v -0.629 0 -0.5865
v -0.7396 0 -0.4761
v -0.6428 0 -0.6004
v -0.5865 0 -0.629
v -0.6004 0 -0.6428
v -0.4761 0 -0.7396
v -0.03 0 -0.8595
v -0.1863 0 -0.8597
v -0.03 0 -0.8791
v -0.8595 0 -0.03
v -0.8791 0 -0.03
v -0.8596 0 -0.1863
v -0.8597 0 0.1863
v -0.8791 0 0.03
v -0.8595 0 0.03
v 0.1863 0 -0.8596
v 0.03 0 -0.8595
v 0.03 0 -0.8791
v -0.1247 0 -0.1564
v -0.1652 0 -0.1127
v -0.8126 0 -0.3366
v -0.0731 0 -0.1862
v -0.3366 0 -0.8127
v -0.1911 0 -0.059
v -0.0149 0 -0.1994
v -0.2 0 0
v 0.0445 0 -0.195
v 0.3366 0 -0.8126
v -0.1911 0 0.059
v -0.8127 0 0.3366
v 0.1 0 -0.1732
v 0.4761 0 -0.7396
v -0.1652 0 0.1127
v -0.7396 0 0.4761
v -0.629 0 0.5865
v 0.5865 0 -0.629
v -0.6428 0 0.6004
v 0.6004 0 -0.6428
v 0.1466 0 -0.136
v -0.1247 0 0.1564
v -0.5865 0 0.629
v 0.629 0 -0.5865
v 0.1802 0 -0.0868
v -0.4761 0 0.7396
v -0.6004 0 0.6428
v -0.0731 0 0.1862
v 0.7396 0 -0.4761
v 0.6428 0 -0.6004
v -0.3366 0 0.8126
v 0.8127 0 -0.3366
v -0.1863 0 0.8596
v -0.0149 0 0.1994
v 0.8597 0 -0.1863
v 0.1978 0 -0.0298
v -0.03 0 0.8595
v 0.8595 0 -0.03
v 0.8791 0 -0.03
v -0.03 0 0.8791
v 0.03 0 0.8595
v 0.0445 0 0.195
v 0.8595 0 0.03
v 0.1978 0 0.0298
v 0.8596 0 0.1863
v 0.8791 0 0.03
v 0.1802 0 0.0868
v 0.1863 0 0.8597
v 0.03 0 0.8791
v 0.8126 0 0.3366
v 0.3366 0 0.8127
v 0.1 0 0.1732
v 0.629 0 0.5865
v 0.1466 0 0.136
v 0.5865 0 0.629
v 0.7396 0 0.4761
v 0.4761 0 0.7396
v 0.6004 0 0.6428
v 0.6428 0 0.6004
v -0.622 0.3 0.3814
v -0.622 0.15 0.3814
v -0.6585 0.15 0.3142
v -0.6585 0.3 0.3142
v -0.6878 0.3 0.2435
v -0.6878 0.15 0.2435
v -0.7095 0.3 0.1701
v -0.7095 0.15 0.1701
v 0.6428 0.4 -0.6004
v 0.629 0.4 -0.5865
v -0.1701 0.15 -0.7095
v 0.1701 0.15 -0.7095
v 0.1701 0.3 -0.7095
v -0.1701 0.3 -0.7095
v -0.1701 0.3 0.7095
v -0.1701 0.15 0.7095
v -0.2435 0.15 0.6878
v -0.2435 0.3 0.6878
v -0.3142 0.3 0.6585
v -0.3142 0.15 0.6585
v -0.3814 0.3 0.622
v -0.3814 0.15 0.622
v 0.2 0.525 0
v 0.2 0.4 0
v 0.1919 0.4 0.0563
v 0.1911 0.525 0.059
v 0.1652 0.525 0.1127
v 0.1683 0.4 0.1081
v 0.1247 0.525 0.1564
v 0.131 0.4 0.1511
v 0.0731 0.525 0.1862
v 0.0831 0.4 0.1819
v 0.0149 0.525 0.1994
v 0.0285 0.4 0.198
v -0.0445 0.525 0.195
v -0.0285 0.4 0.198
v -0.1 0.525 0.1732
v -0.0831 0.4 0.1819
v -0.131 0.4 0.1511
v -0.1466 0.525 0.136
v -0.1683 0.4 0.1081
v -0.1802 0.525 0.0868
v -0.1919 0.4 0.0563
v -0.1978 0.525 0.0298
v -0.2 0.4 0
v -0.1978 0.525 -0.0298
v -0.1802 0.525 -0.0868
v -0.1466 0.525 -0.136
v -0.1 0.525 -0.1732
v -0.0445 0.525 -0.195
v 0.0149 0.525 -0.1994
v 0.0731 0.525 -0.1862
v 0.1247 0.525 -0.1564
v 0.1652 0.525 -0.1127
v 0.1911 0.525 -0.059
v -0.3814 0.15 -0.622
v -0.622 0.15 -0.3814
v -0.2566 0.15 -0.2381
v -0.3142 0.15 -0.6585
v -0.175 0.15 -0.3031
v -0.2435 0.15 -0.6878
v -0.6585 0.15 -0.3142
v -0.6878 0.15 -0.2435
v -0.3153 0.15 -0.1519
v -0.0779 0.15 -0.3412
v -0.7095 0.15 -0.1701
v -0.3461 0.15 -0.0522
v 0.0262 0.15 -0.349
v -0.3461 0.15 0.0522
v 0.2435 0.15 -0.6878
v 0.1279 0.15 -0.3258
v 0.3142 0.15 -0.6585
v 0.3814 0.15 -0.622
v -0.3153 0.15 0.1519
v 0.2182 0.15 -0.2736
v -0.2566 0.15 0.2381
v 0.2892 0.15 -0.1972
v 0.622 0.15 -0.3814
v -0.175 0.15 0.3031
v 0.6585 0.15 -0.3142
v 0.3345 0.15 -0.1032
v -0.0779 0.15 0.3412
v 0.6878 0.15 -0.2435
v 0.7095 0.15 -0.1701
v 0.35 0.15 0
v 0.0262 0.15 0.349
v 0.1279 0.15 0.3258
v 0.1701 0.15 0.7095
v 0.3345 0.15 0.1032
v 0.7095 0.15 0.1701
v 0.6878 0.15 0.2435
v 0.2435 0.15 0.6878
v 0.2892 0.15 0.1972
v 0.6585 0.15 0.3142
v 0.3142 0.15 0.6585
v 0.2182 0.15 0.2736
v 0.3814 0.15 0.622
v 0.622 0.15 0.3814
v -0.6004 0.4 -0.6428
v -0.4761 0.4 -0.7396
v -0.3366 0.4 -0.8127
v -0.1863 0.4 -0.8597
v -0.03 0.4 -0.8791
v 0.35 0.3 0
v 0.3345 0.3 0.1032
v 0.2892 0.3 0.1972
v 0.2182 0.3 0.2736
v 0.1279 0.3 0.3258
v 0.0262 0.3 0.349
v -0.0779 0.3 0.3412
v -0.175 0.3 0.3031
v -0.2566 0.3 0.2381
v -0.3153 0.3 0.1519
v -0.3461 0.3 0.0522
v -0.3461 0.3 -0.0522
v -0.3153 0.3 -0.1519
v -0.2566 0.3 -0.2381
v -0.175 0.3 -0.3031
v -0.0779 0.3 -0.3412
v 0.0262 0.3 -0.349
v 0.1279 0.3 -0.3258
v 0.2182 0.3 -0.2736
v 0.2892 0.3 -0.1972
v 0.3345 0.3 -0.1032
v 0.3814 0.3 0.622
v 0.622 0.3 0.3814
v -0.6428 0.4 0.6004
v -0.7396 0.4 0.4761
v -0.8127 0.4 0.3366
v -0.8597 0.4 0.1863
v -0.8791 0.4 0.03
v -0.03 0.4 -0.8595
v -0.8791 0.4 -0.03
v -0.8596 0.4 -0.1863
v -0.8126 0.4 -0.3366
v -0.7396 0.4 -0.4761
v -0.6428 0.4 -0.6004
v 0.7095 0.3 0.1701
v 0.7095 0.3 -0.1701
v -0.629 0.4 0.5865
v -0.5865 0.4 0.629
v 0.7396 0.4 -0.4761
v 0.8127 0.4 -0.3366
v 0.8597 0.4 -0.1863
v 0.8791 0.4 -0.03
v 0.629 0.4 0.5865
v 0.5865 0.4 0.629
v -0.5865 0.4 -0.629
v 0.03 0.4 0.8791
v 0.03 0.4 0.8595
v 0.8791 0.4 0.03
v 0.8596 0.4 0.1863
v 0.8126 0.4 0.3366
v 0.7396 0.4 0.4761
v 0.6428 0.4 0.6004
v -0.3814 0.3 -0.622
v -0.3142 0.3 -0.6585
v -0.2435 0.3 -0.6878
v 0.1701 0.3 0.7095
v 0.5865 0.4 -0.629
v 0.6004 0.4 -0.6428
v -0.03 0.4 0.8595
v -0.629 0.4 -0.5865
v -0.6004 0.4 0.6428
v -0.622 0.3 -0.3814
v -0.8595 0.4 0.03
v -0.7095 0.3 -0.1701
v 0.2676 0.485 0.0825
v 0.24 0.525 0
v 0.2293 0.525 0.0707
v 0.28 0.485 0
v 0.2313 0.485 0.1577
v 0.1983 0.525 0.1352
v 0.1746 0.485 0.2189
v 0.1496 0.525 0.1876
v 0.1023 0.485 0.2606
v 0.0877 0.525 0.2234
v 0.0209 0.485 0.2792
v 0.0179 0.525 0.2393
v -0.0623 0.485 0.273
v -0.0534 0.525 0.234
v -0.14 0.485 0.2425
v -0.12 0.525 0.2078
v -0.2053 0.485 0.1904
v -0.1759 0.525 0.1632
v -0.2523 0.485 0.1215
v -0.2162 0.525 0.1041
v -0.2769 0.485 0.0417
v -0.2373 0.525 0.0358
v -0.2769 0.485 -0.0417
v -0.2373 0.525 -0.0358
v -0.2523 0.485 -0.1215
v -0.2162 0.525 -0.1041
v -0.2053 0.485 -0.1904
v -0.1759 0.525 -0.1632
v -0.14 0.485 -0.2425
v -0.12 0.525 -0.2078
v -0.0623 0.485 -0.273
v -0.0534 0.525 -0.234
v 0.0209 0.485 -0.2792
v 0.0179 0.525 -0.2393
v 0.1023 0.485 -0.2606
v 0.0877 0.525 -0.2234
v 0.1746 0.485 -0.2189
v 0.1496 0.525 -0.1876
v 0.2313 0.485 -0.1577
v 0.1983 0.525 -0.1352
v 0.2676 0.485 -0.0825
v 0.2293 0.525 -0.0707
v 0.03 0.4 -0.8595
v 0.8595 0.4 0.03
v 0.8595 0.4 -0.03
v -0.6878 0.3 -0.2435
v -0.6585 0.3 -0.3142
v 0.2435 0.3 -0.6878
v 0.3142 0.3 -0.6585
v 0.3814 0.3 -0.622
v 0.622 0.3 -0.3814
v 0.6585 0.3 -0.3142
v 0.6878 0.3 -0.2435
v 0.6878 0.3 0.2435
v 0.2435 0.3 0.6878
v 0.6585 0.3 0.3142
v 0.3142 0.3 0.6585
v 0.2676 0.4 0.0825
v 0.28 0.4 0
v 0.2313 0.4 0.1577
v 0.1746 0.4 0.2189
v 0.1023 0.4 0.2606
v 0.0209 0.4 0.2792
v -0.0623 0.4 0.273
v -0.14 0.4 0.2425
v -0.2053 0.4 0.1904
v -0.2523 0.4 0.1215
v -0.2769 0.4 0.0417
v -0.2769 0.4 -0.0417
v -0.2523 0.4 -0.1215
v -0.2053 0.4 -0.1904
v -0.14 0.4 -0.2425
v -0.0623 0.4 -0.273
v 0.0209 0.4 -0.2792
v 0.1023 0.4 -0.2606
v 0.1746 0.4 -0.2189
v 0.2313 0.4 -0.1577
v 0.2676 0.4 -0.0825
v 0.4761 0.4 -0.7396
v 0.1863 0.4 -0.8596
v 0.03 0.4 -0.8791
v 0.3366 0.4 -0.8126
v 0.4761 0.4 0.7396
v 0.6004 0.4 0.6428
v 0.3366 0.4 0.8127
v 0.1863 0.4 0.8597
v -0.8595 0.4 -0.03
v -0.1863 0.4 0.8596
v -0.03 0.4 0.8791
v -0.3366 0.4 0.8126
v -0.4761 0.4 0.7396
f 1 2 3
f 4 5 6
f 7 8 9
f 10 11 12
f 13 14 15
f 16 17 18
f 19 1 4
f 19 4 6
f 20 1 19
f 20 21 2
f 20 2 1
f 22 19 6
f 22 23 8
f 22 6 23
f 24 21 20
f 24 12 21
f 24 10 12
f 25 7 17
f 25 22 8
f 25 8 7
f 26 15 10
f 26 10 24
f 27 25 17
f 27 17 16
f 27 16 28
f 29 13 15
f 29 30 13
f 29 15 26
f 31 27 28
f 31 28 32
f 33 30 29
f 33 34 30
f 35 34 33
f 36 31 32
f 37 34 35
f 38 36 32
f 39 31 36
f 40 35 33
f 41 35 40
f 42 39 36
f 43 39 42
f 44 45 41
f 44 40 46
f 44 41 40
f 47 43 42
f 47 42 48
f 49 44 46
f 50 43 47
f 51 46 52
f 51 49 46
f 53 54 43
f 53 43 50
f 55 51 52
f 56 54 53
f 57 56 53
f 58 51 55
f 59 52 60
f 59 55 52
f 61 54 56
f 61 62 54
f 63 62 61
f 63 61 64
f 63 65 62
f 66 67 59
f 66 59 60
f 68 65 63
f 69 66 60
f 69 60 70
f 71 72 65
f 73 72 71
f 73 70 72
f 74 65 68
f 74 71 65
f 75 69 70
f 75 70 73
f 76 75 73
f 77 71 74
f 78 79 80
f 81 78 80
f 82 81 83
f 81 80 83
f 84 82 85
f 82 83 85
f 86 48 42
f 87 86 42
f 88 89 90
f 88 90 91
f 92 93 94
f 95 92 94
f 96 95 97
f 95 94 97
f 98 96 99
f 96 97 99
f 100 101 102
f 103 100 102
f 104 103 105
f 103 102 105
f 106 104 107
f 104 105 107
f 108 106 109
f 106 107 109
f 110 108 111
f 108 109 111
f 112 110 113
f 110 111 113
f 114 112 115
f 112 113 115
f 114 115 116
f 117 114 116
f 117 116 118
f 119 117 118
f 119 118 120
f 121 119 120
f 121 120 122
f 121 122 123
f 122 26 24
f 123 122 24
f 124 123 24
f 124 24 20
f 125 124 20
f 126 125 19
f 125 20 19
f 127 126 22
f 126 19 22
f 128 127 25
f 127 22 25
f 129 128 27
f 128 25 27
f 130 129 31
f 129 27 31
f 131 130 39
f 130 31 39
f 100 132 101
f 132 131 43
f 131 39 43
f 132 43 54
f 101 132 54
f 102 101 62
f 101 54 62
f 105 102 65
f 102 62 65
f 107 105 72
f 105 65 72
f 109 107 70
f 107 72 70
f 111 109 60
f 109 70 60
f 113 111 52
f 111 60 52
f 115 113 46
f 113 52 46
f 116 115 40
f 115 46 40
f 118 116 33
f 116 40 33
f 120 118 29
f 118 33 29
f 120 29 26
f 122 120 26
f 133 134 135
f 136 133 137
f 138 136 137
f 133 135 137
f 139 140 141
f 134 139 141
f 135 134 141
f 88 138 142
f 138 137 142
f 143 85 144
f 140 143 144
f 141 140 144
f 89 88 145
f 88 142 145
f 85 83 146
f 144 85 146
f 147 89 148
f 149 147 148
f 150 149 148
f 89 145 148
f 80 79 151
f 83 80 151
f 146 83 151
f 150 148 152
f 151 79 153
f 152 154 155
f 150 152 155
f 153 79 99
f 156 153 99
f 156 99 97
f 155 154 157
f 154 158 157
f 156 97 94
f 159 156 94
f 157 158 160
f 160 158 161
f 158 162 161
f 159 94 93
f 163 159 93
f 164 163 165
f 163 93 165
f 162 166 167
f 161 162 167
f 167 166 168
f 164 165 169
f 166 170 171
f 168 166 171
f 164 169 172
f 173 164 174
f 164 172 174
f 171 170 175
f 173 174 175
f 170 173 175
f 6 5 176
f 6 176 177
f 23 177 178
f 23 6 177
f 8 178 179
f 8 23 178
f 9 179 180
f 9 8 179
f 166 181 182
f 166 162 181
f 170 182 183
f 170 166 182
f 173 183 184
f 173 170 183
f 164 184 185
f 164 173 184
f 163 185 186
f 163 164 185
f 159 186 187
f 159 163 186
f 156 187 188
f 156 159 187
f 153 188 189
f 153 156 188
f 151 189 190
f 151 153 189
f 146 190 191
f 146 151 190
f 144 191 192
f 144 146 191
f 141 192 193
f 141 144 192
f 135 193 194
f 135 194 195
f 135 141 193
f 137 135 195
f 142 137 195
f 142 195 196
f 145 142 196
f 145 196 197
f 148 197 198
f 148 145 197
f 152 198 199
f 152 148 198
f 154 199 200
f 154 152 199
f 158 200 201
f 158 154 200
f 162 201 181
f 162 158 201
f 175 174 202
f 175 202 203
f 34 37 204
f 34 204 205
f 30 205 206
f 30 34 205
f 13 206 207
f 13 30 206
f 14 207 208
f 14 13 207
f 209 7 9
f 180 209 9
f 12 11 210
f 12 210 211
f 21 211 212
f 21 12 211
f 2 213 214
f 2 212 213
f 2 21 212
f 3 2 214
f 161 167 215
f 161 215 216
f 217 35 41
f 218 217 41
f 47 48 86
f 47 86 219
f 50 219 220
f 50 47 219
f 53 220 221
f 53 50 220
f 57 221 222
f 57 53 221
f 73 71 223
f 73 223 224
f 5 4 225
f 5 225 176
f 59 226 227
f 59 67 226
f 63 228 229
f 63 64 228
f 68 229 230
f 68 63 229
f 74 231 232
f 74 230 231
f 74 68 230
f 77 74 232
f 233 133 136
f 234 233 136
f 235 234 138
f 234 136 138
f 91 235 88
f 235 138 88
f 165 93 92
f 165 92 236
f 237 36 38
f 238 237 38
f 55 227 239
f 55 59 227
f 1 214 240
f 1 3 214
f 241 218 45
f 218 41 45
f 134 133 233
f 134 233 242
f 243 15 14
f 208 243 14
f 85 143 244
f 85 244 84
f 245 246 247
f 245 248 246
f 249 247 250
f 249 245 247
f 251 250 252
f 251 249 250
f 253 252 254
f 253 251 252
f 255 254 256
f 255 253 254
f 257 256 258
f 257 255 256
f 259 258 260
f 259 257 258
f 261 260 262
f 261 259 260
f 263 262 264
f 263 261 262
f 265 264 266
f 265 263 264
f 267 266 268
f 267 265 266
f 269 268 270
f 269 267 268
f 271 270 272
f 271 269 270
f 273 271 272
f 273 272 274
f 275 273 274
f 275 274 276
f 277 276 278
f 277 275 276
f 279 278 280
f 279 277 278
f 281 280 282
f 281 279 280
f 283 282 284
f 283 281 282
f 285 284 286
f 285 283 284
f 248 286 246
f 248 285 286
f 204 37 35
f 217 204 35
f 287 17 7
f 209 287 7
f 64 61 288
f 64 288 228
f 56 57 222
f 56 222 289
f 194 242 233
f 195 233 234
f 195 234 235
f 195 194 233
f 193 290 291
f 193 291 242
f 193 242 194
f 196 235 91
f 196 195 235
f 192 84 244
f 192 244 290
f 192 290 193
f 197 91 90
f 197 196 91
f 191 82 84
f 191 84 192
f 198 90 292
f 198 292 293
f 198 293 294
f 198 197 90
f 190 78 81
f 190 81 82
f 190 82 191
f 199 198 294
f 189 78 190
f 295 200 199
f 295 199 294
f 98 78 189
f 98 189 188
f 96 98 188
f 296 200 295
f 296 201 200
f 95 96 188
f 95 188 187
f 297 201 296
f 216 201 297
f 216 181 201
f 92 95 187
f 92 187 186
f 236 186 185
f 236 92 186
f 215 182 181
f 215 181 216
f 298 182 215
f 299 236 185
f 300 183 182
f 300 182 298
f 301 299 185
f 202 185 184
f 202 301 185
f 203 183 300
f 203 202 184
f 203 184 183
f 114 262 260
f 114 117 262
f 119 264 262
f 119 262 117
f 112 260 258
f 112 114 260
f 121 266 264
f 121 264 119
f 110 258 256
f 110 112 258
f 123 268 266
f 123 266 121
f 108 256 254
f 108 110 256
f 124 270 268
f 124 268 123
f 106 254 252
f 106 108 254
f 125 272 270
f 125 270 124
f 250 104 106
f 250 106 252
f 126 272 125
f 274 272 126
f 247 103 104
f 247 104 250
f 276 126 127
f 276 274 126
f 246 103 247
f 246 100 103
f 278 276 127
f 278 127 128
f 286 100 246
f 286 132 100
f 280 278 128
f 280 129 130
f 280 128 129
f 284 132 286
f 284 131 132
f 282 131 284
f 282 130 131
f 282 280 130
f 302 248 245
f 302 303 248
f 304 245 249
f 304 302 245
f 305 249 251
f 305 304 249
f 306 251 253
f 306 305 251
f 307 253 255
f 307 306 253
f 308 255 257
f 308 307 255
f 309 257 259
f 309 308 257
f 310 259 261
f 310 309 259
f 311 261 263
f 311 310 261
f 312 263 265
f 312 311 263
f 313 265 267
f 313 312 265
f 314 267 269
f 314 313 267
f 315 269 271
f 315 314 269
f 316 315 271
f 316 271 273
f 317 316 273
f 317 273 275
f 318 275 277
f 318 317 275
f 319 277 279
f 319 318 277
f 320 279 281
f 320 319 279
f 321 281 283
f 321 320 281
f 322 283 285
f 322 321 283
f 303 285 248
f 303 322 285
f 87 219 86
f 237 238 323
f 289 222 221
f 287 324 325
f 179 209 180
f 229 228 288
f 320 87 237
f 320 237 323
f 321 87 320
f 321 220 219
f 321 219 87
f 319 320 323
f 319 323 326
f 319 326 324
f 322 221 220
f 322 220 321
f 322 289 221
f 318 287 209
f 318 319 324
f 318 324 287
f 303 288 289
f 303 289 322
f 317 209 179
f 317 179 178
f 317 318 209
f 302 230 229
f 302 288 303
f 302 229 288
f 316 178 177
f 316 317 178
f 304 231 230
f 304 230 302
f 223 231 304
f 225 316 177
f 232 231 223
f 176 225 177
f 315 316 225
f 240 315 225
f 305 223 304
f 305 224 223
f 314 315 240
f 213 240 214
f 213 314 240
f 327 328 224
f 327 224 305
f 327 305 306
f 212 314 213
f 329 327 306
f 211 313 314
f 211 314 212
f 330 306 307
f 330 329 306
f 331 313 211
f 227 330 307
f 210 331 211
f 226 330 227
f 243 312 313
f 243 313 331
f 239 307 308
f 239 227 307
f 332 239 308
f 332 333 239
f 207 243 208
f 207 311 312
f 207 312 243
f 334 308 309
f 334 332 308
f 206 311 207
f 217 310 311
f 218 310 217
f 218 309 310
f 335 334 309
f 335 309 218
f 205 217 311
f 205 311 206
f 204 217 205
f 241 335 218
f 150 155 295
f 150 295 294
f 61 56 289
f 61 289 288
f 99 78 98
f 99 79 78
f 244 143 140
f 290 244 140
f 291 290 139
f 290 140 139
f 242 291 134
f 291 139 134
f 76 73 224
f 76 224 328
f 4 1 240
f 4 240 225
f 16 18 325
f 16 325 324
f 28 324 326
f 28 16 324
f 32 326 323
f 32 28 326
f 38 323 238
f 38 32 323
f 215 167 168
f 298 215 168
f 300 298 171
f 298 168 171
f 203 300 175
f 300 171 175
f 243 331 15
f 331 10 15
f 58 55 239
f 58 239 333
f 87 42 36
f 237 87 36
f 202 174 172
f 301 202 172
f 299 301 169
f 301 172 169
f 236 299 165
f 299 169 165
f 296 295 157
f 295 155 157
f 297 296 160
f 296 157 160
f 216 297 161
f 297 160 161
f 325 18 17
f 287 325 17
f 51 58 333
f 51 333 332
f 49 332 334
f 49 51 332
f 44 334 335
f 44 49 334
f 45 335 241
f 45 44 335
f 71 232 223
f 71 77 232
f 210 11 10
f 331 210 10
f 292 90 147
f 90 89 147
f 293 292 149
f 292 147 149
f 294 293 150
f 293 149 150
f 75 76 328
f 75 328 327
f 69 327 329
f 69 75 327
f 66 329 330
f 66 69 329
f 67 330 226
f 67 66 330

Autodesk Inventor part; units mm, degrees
ref_plane "YZ Plane" through (0, 0, 0) normal (1, 0, 0) x (0, 1, 0)
ref_plane "XZ Plane" through (0, 0, 0) normal (0, 1, 0) x (-1, 0, 0)
ref_plane "XY Plane" through (0, 0, 0) normal (0, 0, 1) x (1, 0, 0)
sketch "Boceto1" plane through (0, 0, 0) normal (0, 1, 0) x (-1, 0, 0)
  circle A0 centre (0, 0) radius 0.2442
  circle A1 centre (0, 0) radius 0.28
  line L0 (-0.03, -0.8791) -> (-0.03, -0.8595)
  line L1 (-0.03, -0.8595) -> (0.03, -0.8595)
  line L2 (0.03, -0.8595) -> (0.03, -0.8791)
  line L3 (-0.6428, -0.6004) -> (-0.629, -0.5865)
  line L4 (-0.629, -0.5865) -> (-0.5865, -0.629)
  line L5 (-0.5865, -0.629) -> (-0.6004, -0.6428)
  line L6 (-0.8791, -0.03) -> (-0.8595, -0.03)
  line L7 (-0.8595, -0.03) -> (-0.8595, 0.03)
  line L8 (-0.8595, 0.03) -> (-0.8791, 0.03)
  arc A2 (-0.8791, -0.03) -> (-0.6428, -0.6004) centre (0, 0) ccw
  arc A3 (-0.6004, -0.6428) -> (-0.03, -0.8791) centre (0, 0) ccw
  line L9 (0.03, -0.8791) -> (0.03, -0.8595)
  line L10 (0.03, -0.8595) -> (-0.03, -0.8595)
  line L11 (-0.03, -0.8595) -> (-0.03, -0.8791)
  line L12 (0.6428, -0.6004) -> (0.629, -0.5865)
  line L13 (0.629, -0.5865) -> (0.5865, -0.629)
  line L14 (0.5865, -0.629) -> (0.6004, -0.6428)
  line L15 (0.8791, -0.03) -> (0.8595, -0.03)
  line L16 (0.8595, -0.03) -> (0.8595, 0.03)
  line L17 (0.8595, 0.03) -> (0.8791, 0.03)
  arc A4 (0.6428, -0.6004) -> (0.8791, -0.03) centre (0, 0) ccw
  arc A5 (0.03, -0.8791) -> (0.6004, -0.6428) centre (0, 0) ccw
  line L18 (-0.03, 0.8791) -> (-0.03, 0.8595)
  line L19 (-0.03, 0.8595) -> (0.03, 0.8595)
  line L20 (0.03, 0.8595) -> (0.03, 0.8791)
  line L21 (-0.6428, 0.6004) -> (-0.629, 0.5865)
  line L22 (-0.629, 0.5865) -> (-0.5865, 0.629)
  line L23 (-0.5865, 0.629) -> (-0.6004, 0.6428)
  line L24 (-0.8791, 0.03) -> (-0.8595, 0.03)
  line L25 (-0.8595, 0.03) -> (-0.8595, -0.03)
  line L26 (-0.8595, -0.03) -> (-0.8791, -0.03)
  arc A6 (-0.6428, 0.6004) -> (-0.8791, 0.03) centre (0, 0) ccw
  arc A7 (-0.03, 0.8791) -> (-0.6004, 0.6428) centre (0, 0) ccw
  line L27 (0.03, 0.8791) -> (0.03, 0.8595)
  line L28 (0.03, 0.8595) -> (-0.03, 0.8595)
  line L29 (-0.03, 0.8595) -> (-0.03, 0.8791)
  line L30 (0.6428, 0.6004) -> (0.629, 0.5865)
  line L31 (0.629, 0.5865) -> (0.5865, 0.629)
  line L32 (0.5865, 0.629) -> (0.6004, 0.6428)
  line L33 (0.8791, 0.03) -> (0.8595, 0.03)
  line L34 (0.8595, 0.03) -> (0.8595, -0.03)
  line L35 (0.8595, -0.03) -> (0.8791, -0.03)
  arc A8 (0.8791, 0.03) -> (0.6428, 0.6004) centre (0, 0) ccw
  arc A9 (0.6004, 0.6428) -> (0.03, 0.8791) centre (0, 0) ccw
  circle A10 centre (0, 0) radius 0.2
  point P0 (0, 0)
extrude "Extrusión1" add sketch "Boceto1" along normal blind 0.4 contours A0 | A1 | A3 L5 L4 L3 A2 L6 L7 L8 A6 L21 L22 L23 A7 L18 L19 L20 A9 L32 L31 L30 A8 L17 L16 L15 A4 L12 L13 L14 A5 L2 L1 L0
sketch "Boceto2" plane through (0, 0.4, 0) normal (0, 1, 0) x (1, 0, 0)
  circle A0 centre (0, 0) radius 0.2442
  circle A1 centre (0, 0) radius 0.28
  line L0 (-0.03, -0.8791) -> (-0.03, -0.8595)
  line L1 (-0.03, -0.8595) -> (0.03, -0.8595)
  line L2 (0.03, -0.8595) -> (0.03, -0.8791)
  line L3 (-0.6428, -0.6004) -> (-0.629, -0.5865)
  line L4 (-0.629, -0.5865) -> (-0.5865, -0.629)
  line L5 (-0.5865, -0.629) -> (-0.6004, -0.6428)
  line L6 (-0.8791, -0.03) -> (-0.8595, -0.03)
  line L7 (-0.8595, -0.03) -> (-0.8595, 0.03)
  line L8 (-0.8595, 0.03) -> (-0.8791, 0.03)
  arc A2 (-0.8791, -0.03) -> (-0.6428, -0.6004) centre (0, 0) ccw
  arc A3 (-0.6004, -0.6428) -> (-0.03, -0.8791) centre (0, 0) ccw
  line L9 (0.03, -0.8791) -> (0.03, -0.8595)
  line L10 (0.03, -0.8595) -> (-0.03, -0.8595)
  line L11 (-0.03, -0.8595) -> (-0.03, -0.8791)
  line L12 (0.6428, -0.6004) -> (0.629, -0.5865)
  line L13 (0.629, -0.5865) -> (0.5865, -0.629)
  line L14 (0.5865, -0.629) -> (0.6004, -0.6428)
  line L15 (0.8791, -0.03) -> (0.8595, -0.03)
  line L16 (0.8595, -0.03) -> (0.8595, 0.03)
  line L17 (0.8595, 0.03) -> (0.8791, 0.03)
  arc A4 (0.6428, -0.6004) -> (0.8791, -0.03) centre (0, 0) ccw
  arc A5 (0.03, -0.8791) -> (0.6004, -0.6428) centre (0, 0) ccw
  line L18 (-0.03, 0.8791) -> (-0.03, 0.8595)
  line L19 (-0.03, 0.8595) -> (0.03, 0.8595)
  line L20 (0.03, 0.8595) -> (0.03, 0.8791)
  line L21 (-0.6428, 0.6004) -> (-0.629, 0.5865)
  line L22 (-0.629, 0.5865) -> (-0.5865, 0.629)
  line L23 (-0.5865, 0.629) -> (-0.6004, 0.6428)
  line L24 (-0.8791, 0.03) -> (-0.8595, 0.03)
  line L25 (-0.8595, 0.03) -> (-0.8595, -0.03)
  line L26 (-0.8595, -0.03) -> (-0.8791, -0.03)
  arc A6 (-0.6428, 0.6004) -> (-0.8791, 0.03) centre (0, 0) ccw
  arc A7 (-0.03, 0.8791) -> (-0.6004, 0.6428) centre (0, 0) ccw
  line L27 (0.03, 0.8791) -> (0.03, 0.8595)
  line L28 (0.03, 0.8595) -> (-0.03, 0.8595)
  line L29 (-0.03, 0.8595) -> (-0.03, 0.8791)
  line L30 (0.6428, 0.6004) -> (0.629, 0.5865)
  line L31 (0.629, 0.5865) -> (0.5865, 0.629)
  line L32 (0.5865, 0.629) -> (0.6004, 0.6428)
  line L33 (0.8791, 0.03) -> (0.8595, 0.03)
  line L34 (0.8595, 0.03) -> (0.8595, -0.03)
  line L35 (0.8595, -0.03) -> (0.8791, -0.03)
  arc A8 (0.8791, 0.03) -> (0.6428, 0.6004) centre (0, 0) ccw
  arc A9 (0.6004, 0.6428) -> (0.03, 0.8791) centre (0, 0) ccw
  circle A10 centre (0, 0) radius 0.2
extrude "Extrusión2" add sketch "Boceto2" along normal blind 0.125 contours A0 | A1
chamfer "Chaflán1" distance 0.04 angle 45 1 edges at (-0.28, 0.525, 0)
sketch "Boceto3" plane through (0, 0, 0) normal (0, -1, 0) x (1, 0, 0)
  circle A0 centre (0, 0) radius 0.2 projected
  circle A1 centre (0, 0) radius 0.2 projected
  line L0 (0.03, -0.8791) -> (0.03, -0.8595) projected
  arc A2 (0.03, -0.8791) -> (0.6004, -0.6428) centre (0, 0) ccw projected
  line L1 (0.5865, -0.629) -> (0.6004, -0.6428) projected
  line L2 (0.629, -0.5865) -> (0.5865, -0.629) projected
  line L3 (0.6428, -0.6004) -> (0.629, -0.5865) projected
  arc A3 (0.6428, -0.6004) -> (0.8791, -0.03) centre (0, 0) ccw projected
  line L4 (0.8595, -0.03) -> (0.8791, -0.03) projected
  line L5 (0.8595, 0.03) -> (0.8595, -0.03) projected
  line L6 (0.8791, 0.03) -> (0.8595, 0.03) projected
  arc A4 (0.8791, 0.03) -> (0.6428, 0.6004) centre (0, 0) ccw projected
  line L7 (0.629, 0.5865) -> (0.6428, 0.6004) projected
  line L8 (0.5865, 0.629) -> (0.629, 0.5865) projected
  line L9 (0.6004, 0.6428) -> (0.5865, 0.629) projected
  arc A5 (0.6004, 0.6428) -> (0.03, 0.8791) centre (0, 0) ccw projected
  line L10 (0.03, 0.8595) -> (0.03, 0.8791) projected
  line L11 (-0.03, 0.8595) -> (0.03, 0.8595) projected
  line L12 (-0.03, 0.8791) -> (-0.03, 0.8595) projected
  arc A6 (-0.03, 0.8791) -> (-0.6004, 0.6428) centre (0, 0) ccw projected
  line L13 (-0.5865, 0.629) -> (-0.6004, 0.6428) projected
  line L14 (-0.629, 0.5865) -> (-0.5865, 0.629) projected
  line L15 (-0.6428, 0.6004) -> (-0.629, 0.5865) projected
  arc A7 (-0.6428, 0.6004) -> (-0.8791, 0.03) centre (0, 0) ccw projected
  line L16 (-0.8595, 0.03) -> (-0.8791, 0.03) projected
  line L17 (-0.8595, -0.03) -> (-0.8595, 0.03) projected
  line L18 (-0.8791, -0.03) -> (-0.8595, -0.03) projected
  arc A8 (-0.8791, -0.03) -> (-0.6428, -0.6004) centre (0, 0) ccw projected
  line L19 (-0.629, -0.5865) -> (-0.6428, -0.6004) projected
  line L20 (-0.5865, -0.629) -> (-0.629, -0.5865) projected
  line L21 (-0.6004, -0.6428) -> (-0.5865, -0.629) projected
  arc A9 (-0.6004, -0.6428) -> (-0.03, -0.8791) centre (0, 0) ccw projected
  line L22 (-0.03, -0.8595) -> (-0.03, -0.8791) projected
  line L23 (0.03, -0.8595) -> (-0.03, -0.8595) projected
  arc A10 (0.7095, 0.1701) -> (0.622, 0.3814) centre (0, 0) ccw
  line L24 (0.7095, 0.1701) -> (0.7095, -0.1701)
  arc A11 (0.622, -0.3814) -> (0.7095, -0.1701) centre (0, 0) ccw
  line L25 (0.622, -0.3814) -> (0.3814, -0.622)
  arc A12 (0.1701, -0.7095) -> (0.3814, -0.622) centre (0, 0) ccw
  line L26 (0.1701, -0.7095) -> (-0.1701, -0.7095)
  arc A13 (-0.3814, -0.622) -> (-0.1701, -0.7095) centre (0, 0) ccw
  line L27 (-0.3814, -0.622) -> (-0.622, -0.3814)
  arc A14 (-0.7095, -0.1701) -> (-0.622, -0.3814) centre (0, 0) ccw
  line L28 (-0.7095, -0.1701) -> (-0.7095, 0.1701)
  arc A15 (-0.622, 0.3814) -> (-0.7095, 0.1701) centre (0, 0) ccw
  line L29 (-0.622, 0.3814) -> (-0.3814, 0.622)
  arc A16 (-0.1701, 0.7095) -> (-0.3814, 0.622) centre (0, 0) ccw
  line L30 (-0.1701, 0.7095) -> (0.1701, 0.7095)
  arc A17 (0.3814, 0.622) -> (0.1701, 0.7095) centre (0, 0) ccw
  line L31 (0.3814, 0.622) -> (0.622, 0.3814)
  circle A18 centre (0, 0) radius 0.35
  point P0 (0, 0)
  dimension "d7" = 0.15
  dimension "d8" = 0.15
extrude "Extrusión3" cut sketch "Boceto3" against normal blind 0.3 contours L24 A11 L25 A12 L26 A13 L27 A14 L28 A15 L29 A16 L30 A17 L31 A10
sketch "Boceto4" plane through (0, 0, 0) normal (0, -1, 0) x (1, 0, 0)
  circle A0 centre (0, 0) radius 0.35 projected
  arc A1 (0.7095, 0.1701) -> (0.622, 0.3814) centre (0, 0) ccw projected
  line L0 (0.3814, 0.622) -> (0.622, 0.3814) projected
  arc A2 (0.3814, 0.622) -> (0.1701, 0.7095) centre (0, 0) ccw projected
  line L1 (-0.1701, 0.7095) -> (0.1701, 0.7095) projected
  arc A3 (-0.1701, 0.7095) -> (-0.3814, 0.622) centre (0, 0) ccw projected
  line L2 (-0.622, 0.3814) -> (-0.3814, 0.622) projected
  arc A4 (-0.622, 0.3814) -> (-0.7095, 0.1701) centre (0, 0) ccw projected
  line L3 (-0.7095, -0.1701) -> (-0.7095, 0.1701) projected
  arc A5 (-0.7095, -0.1701) -> (-0.622, -0.3814) centre (0, 0) ccw projected
  line L4 (-0.3814, -0.622) -> (-0.622, -0.3814) projected
  arc A6 (-0.3814, -0.622) -> (-0.1701, -0.7095) centre (0, 0) ccw projected
  line L5 (0.1701, -0.7095) -> (-0.1701, -0.7095) projected
  arc A7 (0.1701, -0.7095) -> (0.3814, -0.622) centre (0, 0) ccw projected
  line L6 (0.622, -0.3814) -> (0.3814, -0.622) projected
  arc A8 (0.622, -0.3814) -> (0.7095, -0.1701) centre (0, 0) ccw projected
  line L7 (0.7095, 0.1701) -> (0.7095, -0.1701) projected
  point P0 (0, 0)
extrude "Extrusión4" add sketch "Boceto4" against normal blind 0.15
properties part number "ET2"
